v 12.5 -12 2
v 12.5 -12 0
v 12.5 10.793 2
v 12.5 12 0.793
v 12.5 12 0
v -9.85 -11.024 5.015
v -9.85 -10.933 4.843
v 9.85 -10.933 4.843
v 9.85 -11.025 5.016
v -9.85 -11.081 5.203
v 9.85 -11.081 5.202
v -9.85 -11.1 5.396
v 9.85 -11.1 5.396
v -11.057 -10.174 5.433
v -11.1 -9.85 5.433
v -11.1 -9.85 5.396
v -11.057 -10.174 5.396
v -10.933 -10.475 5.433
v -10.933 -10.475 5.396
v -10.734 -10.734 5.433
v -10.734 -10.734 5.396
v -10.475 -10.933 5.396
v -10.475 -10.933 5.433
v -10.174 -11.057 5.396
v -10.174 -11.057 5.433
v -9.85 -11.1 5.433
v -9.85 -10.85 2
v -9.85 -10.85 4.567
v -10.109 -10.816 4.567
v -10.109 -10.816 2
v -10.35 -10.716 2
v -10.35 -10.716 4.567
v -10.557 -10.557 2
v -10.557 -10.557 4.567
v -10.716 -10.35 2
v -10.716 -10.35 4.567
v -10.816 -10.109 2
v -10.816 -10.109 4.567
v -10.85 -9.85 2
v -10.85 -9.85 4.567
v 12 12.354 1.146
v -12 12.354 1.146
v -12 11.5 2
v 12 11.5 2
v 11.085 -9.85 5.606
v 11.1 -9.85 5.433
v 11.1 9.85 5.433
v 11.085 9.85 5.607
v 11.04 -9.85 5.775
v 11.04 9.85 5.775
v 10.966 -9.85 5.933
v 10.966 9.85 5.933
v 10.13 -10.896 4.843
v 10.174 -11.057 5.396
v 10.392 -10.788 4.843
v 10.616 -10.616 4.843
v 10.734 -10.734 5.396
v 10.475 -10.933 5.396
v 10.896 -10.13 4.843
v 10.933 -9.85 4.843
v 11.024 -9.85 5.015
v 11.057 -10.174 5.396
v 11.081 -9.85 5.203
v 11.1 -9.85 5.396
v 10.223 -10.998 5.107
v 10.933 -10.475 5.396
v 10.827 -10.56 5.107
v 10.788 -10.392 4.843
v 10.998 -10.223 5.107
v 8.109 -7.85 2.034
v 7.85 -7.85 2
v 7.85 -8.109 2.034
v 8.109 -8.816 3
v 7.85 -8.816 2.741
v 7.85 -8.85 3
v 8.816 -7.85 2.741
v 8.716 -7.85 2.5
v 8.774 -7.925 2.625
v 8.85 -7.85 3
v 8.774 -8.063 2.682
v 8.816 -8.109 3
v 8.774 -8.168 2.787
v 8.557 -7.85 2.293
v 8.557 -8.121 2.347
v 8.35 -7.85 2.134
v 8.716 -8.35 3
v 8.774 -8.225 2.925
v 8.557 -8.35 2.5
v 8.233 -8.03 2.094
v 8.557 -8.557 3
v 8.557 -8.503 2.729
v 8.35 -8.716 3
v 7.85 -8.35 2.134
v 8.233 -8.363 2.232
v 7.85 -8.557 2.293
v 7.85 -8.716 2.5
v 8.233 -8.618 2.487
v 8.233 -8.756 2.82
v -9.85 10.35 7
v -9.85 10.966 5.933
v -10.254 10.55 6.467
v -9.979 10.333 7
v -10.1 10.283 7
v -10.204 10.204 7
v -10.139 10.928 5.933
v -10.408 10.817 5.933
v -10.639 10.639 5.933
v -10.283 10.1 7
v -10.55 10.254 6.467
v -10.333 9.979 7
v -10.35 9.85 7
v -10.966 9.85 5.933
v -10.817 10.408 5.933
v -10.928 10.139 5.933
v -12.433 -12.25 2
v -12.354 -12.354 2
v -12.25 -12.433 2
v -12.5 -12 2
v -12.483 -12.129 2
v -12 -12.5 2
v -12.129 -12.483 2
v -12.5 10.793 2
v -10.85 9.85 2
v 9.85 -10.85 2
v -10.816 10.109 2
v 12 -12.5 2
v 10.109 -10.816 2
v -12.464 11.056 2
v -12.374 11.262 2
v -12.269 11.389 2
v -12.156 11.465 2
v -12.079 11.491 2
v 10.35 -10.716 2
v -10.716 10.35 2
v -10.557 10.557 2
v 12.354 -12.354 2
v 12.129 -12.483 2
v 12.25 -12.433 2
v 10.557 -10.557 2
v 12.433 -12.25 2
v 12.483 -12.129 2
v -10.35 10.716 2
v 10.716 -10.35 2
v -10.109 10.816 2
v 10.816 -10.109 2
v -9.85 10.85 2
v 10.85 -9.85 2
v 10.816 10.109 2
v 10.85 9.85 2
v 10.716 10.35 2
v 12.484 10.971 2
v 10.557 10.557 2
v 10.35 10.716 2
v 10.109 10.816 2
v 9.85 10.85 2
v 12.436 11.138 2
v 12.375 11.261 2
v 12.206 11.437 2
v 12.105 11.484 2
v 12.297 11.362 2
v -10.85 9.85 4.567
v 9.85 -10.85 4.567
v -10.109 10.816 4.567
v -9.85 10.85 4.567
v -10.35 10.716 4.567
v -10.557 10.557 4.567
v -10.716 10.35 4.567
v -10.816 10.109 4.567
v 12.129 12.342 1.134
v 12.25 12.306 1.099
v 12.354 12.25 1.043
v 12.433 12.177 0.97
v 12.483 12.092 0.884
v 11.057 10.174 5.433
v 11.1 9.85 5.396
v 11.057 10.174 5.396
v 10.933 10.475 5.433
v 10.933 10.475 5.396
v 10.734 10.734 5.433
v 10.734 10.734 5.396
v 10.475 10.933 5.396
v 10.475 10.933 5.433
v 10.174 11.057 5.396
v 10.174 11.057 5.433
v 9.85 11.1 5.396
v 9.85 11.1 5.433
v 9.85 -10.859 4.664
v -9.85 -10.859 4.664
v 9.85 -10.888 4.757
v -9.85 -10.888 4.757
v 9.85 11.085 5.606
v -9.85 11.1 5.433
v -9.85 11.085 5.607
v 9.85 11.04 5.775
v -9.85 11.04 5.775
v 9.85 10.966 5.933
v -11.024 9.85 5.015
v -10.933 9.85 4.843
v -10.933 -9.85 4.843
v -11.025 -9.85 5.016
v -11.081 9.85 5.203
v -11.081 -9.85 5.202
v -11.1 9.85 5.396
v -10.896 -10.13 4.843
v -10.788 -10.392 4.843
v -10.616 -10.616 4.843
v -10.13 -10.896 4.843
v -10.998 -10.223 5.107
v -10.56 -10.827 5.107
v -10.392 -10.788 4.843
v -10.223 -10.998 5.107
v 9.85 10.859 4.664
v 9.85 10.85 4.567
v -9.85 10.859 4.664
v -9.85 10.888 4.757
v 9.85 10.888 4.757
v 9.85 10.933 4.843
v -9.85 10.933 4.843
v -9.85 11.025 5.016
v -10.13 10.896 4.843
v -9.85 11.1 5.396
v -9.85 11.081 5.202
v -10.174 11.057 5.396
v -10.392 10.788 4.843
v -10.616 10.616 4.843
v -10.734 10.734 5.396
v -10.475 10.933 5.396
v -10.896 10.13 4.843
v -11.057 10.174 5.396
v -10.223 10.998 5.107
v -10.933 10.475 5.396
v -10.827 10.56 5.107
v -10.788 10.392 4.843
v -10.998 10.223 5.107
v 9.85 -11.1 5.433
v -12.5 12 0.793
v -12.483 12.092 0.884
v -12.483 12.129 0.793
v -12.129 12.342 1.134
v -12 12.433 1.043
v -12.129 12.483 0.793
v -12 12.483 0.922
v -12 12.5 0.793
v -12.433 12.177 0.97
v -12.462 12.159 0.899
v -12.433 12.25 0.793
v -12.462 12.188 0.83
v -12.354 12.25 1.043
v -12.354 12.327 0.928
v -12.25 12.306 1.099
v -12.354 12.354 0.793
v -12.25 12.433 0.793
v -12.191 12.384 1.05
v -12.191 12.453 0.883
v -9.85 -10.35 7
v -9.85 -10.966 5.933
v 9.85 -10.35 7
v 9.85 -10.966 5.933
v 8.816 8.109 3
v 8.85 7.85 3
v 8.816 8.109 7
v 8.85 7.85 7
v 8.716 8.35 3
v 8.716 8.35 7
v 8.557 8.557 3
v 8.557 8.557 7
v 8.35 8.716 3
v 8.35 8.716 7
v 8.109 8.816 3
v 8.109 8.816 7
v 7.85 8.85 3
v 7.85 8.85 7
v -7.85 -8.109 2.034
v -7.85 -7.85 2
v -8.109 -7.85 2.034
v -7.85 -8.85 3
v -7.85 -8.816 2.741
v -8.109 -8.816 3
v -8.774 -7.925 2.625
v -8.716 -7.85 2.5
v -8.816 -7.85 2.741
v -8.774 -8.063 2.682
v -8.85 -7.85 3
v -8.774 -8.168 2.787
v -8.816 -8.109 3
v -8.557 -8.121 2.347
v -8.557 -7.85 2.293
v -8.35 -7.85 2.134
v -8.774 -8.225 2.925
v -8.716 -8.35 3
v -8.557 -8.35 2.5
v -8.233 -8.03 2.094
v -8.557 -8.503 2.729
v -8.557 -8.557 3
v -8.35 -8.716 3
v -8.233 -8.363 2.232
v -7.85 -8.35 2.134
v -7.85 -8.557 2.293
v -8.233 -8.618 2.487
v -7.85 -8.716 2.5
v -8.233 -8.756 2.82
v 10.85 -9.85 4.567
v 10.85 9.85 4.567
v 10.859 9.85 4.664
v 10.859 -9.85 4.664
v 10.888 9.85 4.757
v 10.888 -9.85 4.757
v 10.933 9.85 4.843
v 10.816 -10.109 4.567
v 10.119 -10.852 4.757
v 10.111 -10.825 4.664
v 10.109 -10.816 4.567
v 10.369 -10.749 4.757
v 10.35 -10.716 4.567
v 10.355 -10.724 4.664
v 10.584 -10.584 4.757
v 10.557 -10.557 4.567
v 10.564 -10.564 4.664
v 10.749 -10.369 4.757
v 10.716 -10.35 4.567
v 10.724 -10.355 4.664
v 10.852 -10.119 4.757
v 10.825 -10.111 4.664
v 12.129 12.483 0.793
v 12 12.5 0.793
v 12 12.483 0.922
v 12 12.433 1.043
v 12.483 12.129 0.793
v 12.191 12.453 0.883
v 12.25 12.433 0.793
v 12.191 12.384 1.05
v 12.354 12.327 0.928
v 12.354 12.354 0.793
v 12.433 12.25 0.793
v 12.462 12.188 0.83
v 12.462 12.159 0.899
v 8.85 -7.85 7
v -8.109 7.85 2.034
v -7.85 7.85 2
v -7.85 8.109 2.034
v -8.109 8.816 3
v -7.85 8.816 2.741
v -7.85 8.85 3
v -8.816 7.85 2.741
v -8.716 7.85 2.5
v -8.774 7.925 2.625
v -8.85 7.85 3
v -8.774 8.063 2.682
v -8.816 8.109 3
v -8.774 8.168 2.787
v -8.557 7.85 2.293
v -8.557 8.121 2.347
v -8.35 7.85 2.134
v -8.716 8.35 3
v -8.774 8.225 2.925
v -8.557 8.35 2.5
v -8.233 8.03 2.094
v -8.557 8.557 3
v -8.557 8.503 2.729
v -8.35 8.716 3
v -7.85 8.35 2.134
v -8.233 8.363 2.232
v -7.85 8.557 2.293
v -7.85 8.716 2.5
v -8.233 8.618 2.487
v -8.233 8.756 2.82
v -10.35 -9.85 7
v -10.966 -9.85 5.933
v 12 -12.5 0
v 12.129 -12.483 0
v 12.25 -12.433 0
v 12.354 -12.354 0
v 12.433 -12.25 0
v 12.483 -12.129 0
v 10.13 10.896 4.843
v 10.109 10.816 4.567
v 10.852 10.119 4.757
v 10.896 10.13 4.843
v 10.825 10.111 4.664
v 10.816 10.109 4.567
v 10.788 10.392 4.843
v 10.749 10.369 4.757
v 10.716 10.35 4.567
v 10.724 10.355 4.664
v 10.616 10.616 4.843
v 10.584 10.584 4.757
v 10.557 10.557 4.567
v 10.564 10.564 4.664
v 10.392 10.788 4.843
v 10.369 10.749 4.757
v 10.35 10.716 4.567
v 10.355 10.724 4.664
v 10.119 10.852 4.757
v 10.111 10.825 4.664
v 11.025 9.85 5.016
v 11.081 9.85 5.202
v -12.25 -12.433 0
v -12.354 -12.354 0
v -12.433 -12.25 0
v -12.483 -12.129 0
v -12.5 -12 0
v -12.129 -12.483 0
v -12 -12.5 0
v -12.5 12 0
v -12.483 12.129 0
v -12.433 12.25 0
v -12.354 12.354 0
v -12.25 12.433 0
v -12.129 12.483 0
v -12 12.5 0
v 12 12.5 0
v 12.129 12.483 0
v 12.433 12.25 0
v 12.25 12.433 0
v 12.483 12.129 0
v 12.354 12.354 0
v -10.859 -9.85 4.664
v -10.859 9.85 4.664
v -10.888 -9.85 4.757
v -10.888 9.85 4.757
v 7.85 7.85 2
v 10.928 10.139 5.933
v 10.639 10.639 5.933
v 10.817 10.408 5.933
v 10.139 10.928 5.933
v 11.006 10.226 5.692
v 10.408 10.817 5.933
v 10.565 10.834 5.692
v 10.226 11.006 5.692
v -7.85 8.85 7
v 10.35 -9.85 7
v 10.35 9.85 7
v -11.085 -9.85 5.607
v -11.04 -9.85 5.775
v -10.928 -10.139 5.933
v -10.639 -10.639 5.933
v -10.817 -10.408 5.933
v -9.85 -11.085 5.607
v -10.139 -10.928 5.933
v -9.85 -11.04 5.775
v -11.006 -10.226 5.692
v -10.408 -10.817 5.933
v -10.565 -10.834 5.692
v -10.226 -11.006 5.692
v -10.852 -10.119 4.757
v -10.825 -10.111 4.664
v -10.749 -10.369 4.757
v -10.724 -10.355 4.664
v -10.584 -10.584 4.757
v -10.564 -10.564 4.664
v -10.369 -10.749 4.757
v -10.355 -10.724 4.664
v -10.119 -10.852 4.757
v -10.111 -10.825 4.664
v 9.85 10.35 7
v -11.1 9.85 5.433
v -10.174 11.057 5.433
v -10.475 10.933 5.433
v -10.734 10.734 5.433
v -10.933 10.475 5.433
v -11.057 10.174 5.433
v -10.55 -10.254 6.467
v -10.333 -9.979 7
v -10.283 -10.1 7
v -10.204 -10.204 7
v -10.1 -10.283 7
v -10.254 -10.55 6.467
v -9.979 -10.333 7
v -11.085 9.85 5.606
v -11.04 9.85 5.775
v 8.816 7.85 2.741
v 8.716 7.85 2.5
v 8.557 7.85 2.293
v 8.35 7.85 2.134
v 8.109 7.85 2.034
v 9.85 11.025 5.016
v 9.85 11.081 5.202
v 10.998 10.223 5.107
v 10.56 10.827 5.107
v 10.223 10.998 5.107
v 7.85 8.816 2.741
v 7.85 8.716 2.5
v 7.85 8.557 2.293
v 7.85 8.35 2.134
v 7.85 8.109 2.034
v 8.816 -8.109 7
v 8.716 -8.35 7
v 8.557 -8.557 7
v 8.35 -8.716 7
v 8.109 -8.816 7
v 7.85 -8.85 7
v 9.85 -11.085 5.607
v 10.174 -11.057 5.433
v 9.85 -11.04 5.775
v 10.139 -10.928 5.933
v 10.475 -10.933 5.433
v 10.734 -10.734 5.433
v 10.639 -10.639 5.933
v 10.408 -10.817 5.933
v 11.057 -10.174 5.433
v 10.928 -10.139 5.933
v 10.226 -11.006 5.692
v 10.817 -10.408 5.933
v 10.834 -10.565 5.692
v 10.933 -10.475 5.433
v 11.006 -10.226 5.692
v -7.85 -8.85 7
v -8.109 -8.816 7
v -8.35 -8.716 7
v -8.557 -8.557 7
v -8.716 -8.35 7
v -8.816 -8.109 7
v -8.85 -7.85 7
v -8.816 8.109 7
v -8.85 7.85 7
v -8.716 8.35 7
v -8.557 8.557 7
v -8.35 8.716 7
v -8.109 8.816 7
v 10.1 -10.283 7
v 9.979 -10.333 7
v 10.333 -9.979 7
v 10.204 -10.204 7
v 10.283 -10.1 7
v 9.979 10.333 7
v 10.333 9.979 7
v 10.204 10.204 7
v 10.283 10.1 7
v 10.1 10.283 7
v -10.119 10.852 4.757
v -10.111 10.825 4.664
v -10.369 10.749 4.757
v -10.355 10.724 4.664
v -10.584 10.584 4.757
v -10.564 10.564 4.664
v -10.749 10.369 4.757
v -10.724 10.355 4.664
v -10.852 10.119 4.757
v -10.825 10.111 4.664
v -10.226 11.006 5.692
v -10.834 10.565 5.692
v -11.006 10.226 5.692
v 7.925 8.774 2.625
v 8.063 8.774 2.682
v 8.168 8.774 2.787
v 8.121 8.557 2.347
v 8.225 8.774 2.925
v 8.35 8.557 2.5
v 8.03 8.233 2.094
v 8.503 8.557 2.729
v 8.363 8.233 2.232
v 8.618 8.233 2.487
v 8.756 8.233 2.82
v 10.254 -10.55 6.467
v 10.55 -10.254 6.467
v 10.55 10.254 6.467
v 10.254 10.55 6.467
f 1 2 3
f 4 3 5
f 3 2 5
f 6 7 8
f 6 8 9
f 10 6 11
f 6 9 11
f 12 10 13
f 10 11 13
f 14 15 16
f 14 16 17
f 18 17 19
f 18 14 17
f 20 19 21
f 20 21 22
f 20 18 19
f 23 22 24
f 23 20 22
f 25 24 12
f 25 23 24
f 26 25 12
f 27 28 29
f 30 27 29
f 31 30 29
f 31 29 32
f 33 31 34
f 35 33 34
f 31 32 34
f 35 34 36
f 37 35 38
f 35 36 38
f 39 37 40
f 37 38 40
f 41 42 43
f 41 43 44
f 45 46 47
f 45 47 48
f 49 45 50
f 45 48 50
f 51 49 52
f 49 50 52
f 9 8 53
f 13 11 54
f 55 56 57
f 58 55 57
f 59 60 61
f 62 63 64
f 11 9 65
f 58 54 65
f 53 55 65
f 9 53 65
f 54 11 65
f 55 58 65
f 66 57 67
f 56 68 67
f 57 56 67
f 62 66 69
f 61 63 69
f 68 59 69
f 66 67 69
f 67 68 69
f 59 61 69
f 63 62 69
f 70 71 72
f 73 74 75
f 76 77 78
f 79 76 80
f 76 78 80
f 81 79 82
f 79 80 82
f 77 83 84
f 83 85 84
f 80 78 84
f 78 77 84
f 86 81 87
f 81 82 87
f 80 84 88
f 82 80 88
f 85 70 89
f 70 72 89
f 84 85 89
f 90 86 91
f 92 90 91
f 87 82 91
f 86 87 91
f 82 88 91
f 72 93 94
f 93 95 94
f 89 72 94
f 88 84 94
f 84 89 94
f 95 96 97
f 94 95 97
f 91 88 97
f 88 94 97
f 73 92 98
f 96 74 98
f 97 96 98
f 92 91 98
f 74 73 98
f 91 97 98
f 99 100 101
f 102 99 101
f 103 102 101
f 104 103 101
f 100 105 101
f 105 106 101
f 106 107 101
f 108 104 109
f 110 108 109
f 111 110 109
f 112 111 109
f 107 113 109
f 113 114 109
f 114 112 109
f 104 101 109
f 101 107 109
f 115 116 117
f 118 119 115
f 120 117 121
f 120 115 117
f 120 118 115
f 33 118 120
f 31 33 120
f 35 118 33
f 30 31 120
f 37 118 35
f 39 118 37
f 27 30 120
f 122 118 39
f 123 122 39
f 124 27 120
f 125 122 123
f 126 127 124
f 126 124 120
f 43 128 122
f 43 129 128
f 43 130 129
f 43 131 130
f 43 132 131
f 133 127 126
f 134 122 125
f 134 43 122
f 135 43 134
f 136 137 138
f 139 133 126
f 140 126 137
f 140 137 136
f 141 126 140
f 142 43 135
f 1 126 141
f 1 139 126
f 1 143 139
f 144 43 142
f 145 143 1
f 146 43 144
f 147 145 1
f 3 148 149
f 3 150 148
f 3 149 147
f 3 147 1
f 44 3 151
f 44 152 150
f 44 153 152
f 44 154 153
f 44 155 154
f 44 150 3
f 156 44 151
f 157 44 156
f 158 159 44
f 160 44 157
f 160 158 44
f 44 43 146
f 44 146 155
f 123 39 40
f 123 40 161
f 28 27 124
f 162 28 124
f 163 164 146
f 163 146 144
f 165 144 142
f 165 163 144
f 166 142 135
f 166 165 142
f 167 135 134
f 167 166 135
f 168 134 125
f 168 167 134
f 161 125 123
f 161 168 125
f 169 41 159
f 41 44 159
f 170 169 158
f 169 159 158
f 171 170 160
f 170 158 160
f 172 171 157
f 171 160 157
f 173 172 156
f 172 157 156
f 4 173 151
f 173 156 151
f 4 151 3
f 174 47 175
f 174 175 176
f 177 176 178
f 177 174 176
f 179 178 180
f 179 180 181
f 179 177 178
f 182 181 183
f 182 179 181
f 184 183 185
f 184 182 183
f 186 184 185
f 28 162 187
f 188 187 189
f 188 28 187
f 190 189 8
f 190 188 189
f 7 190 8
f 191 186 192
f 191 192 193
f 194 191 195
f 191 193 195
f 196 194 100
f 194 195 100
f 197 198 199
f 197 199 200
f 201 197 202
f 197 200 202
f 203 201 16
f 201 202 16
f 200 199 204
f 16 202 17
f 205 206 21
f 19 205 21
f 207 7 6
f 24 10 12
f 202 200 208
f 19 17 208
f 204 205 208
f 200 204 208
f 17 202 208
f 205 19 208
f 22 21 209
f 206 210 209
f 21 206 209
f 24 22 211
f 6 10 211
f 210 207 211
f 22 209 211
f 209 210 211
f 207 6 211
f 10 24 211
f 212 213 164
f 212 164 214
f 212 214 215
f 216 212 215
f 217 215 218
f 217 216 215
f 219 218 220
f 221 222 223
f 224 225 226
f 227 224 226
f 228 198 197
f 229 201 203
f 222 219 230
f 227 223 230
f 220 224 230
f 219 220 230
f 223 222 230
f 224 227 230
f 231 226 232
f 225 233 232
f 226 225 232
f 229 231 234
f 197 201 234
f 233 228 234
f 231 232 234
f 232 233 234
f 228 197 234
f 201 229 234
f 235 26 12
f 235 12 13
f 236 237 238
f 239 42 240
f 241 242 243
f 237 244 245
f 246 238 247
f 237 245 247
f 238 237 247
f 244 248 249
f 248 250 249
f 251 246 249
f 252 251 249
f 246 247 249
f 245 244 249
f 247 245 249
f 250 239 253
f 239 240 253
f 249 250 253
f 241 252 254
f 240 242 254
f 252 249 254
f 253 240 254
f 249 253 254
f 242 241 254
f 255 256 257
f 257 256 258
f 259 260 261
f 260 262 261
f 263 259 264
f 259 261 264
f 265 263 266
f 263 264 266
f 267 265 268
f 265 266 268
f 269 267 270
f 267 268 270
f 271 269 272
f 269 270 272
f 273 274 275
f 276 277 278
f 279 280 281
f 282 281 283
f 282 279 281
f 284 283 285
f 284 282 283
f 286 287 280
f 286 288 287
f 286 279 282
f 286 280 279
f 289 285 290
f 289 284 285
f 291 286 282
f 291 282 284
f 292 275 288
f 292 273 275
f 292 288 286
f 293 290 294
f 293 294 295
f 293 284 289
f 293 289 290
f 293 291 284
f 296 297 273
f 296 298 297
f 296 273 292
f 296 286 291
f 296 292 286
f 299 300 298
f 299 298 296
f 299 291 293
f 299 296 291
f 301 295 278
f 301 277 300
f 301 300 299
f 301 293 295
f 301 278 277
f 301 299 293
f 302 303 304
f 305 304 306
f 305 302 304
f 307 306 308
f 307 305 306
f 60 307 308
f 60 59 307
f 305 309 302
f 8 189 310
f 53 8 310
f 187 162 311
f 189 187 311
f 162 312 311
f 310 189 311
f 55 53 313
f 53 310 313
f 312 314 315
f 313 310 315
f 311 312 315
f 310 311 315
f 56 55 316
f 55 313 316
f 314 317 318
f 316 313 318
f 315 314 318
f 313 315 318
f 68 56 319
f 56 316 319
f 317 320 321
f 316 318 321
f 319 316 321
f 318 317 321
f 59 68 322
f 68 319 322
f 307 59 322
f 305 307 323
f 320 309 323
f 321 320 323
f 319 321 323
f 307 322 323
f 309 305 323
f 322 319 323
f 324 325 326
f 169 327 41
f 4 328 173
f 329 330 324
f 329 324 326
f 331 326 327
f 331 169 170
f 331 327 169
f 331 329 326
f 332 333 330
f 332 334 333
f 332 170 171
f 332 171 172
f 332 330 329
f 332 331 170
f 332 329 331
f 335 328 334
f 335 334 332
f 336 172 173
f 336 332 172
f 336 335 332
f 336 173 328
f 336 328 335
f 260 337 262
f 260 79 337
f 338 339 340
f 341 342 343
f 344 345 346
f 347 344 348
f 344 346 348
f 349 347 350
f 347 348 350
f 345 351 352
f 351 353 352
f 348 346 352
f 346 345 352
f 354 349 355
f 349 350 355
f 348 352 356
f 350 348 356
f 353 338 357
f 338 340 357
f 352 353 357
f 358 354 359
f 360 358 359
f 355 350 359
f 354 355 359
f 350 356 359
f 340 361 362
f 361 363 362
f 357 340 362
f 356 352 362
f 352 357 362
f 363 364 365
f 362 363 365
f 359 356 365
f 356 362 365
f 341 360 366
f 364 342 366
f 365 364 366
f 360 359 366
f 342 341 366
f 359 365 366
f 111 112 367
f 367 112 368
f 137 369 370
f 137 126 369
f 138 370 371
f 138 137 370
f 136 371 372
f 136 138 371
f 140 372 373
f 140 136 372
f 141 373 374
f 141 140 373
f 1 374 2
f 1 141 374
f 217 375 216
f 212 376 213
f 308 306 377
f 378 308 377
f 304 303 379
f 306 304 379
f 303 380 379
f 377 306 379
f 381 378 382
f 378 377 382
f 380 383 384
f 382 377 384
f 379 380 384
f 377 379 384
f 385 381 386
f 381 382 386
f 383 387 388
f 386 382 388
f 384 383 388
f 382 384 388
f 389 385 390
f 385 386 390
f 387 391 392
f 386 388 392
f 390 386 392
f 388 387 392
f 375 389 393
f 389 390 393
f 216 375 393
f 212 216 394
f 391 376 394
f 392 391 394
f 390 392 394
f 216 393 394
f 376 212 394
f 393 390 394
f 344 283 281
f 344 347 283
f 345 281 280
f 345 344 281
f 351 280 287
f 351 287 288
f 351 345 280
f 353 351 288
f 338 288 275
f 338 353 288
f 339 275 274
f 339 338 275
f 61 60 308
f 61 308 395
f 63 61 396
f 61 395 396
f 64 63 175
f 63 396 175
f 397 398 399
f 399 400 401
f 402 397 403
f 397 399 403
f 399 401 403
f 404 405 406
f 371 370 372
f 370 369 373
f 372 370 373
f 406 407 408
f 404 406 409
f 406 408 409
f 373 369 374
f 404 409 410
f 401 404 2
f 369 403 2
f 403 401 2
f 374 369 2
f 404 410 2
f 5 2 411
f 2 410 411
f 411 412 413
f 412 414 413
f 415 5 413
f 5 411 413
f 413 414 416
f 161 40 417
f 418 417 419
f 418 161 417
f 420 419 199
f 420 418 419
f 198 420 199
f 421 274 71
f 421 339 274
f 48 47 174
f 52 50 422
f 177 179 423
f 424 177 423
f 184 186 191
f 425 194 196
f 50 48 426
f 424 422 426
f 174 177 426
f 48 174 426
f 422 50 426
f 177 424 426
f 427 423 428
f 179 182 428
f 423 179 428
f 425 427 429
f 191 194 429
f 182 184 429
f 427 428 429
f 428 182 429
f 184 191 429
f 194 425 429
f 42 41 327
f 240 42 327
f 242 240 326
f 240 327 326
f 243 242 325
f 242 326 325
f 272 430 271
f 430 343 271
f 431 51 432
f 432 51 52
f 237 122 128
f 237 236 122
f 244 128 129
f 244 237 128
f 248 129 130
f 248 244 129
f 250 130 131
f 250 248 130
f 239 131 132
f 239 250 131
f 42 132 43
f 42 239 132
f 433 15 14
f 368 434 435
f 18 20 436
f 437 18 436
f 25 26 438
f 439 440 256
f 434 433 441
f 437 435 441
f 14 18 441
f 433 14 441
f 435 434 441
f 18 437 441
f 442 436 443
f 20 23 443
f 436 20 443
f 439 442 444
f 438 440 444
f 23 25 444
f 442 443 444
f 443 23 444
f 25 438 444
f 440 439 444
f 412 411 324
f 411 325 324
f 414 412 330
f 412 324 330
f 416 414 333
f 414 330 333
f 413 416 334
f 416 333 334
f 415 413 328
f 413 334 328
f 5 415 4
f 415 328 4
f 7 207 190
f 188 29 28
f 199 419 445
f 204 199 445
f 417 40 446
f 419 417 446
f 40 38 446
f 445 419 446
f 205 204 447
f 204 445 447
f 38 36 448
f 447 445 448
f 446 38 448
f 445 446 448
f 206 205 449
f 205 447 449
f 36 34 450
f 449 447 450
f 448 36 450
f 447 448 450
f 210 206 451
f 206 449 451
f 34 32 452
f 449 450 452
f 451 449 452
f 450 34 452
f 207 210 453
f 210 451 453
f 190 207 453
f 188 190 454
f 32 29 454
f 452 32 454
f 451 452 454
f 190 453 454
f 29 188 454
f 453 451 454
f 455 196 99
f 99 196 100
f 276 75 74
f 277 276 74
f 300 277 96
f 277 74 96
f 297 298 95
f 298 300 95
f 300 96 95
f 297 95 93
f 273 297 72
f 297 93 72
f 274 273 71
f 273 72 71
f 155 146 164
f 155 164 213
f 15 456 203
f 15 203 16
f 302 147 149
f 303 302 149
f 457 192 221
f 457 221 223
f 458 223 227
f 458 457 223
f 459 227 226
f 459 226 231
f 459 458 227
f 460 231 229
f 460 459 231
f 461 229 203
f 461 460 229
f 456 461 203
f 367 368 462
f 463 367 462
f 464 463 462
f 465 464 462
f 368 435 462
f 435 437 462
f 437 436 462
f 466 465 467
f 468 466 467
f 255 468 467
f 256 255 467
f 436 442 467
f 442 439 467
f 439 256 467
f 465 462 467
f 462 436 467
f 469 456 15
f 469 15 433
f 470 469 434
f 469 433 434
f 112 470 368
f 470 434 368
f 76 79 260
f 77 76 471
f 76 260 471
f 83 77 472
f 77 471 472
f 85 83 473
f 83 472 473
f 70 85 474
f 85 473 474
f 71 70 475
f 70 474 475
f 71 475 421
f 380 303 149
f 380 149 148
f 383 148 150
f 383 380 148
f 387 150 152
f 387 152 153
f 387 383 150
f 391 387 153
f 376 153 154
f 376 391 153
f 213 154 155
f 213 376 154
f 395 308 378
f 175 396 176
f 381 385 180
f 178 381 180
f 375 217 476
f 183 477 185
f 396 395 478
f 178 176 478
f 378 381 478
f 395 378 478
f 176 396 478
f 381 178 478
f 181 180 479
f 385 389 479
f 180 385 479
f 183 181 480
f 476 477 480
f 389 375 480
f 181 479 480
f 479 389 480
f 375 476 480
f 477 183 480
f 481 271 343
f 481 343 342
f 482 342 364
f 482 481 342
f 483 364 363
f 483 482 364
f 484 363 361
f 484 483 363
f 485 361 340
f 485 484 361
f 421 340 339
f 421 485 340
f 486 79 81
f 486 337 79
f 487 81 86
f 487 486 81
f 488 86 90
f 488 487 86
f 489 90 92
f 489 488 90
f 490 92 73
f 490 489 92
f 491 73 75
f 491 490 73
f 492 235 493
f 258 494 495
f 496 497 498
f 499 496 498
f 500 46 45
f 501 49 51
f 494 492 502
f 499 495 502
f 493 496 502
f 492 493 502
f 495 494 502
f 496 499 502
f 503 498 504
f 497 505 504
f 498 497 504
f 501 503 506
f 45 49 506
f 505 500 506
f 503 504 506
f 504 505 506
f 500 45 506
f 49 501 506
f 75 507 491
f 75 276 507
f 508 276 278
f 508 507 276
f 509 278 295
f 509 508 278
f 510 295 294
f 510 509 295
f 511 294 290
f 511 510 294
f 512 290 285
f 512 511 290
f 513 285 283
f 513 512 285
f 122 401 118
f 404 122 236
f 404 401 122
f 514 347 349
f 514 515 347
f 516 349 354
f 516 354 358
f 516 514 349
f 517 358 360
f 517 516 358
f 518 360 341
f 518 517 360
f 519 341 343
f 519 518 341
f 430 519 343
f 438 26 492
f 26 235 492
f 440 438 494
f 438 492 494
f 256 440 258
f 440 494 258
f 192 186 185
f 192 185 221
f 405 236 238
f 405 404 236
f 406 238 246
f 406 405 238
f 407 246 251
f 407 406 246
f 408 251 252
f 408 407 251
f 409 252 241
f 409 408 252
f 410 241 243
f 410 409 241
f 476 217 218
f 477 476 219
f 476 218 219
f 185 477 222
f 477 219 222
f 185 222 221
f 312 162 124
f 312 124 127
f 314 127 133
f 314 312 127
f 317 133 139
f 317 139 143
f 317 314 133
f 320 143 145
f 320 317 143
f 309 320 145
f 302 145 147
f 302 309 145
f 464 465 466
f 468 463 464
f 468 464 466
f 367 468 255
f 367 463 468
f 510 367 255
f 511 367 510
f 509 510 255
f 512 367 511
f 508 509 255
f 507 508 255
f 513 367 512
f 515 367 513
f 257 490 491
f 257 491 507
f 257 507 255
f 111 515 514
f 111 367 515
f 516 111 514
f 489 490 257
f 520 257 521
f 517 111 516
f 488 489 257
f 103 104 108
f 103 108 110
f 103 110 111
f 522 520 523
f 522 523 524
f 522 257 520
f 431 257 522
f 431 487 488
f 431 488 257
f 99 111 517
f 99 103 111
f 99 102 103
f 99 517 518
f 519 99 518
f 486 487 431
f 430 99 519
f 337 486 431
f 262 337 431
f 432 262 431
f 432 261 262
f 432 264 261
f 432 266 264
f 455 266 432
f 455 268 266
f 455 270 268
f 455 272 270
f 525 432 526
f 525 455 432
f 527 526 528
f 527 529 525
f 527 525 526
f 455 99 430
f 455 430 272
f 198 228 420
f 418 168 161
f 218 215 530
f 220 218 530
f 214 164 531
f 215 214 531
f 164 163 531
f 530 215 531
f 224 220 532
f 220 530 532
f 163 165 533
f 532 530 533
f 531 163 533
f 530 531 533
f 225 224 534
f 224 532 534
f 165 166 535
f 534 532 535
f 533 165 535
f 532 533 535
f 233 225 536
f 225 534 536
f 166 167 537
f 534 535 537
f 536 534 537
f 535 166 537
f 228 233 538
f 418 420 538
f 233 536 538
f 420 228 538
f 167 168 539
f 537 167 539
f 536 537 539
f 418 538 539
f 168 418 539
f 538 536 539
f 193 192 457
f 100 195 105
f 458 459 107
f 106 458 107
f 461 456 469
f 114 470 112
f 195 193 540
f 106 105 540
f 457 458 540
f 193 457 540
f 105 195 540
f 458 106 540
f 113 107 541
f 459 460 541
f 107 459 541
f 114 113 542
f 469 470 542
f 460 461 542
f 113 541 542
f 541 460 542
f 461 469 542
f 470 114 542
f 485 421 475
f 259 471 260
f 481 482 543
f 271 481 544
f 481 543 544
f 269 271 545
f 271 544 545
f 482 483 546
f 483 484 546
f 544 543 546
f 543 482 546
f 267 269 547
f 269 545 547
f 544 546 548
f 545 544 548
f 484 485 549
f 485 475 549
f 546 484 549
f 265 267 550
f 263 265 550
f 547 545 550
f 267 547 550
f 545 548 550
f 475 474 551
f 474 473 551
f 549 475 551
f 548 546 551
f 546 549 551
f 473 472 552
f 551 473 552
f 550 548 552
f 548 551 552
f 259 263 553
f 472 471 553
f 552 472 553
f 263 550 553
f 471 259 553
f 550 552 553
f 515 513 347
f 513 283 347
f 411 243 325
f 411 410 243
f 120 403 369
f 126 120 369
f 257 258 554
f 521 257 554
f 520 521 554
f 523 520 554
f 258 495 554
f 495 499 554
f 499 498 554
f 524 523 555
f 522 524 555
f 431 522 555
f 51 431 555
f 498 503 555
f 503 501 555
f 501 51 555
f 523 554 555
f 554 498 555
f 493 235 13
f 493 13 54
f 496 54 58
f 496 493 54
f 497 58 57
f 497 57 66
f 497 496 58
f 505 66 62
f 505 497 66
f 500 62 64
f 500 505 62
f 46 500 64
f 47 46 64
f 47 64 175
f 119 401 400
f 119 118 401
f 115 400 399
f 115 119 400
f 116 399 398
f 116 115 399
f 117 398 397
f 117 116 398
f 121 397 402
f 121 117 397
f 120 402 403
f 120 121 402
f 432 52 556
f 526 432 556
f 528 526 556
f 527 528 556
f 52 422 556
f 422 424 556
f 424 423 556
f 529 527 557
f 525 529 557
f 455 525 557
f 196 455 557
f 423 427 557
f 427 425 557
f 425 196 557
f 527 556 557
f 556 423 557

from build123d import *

# Parameters (mm, degrees)
SKIZZE1_W                       = 25
SKIZZE1_H                       = 25
AUFSATZ_LINEAR_AUSTRAGEN1_DEPTH = 2
SKIZZE2_W                       = 21.7
SKIZZE2_H                       = 21.7
SKIZZE2_W_2                     = 17.7
SKIZZE2_H_2                     = 17.7
LINEAR_AUSTRAGEN_D_NN1_DEPTH    = 5
VERRUNDUNG1_R                   = 1
LINEAR_AUSTRAGEN_D_NN2_DEPTH    = 2
FASE1_SIZE                      = 0.75
FASE1_SIZE2                     = 1.299038106
VERRUNDUNG2_R                   = 0.5
VERRUNDUNG3_R                   = 1
FASE2_SIZE                      = 1
VERRUNDUNG5_R                   = 0.5
VERRUNDUNG4_R                   = 0.5
VERRUNDUNG6_R                   = 1


with BuildPart() as part:
    # Skizze1 → Aufsatz-Linear austragen1 (new body)
    with BuildSketch(Plane.XY):
        Rectangle(SKIZZE1_W, SKIZZE1_H)
    extrude(amount=AUFSATZ_LINEAR_AUSTRAGEN1_DEPTH)

    # Skizze2 → Linear-Austragen-Dünn1 (add)
    with BuildSketch(Plane.XY.offset(2)):
        Rectangle(SKIZZE2_W, SKIZZE2_H)
        Rectangle(SKIZZE2_W_2, SKIZZE2_H_2, mode=Mode.SUBTRACT)
    extrude(amount=LINEAR_AUSTRAGEN_D_NN1_DEPTH)

    # Verrundung1
    verrundung1_edges = [part.edges().sort_by_distance(p)[0] for p in [
        (-10.85, -10.85, 4.5),
        (10.85, -10.85, 4.5),
        (10.85, 10.85, 4.5),
        (-10.85, 10.85, 4.5),
    ]]
    fillet(verrundung1_edges, radius=VERRUNDUNG1_R)

    # Skizze3 → Linear-Austragen-Dünn2 (add)
    with BuildSketch(Plane.XY.offset(7)):
        with BuildLine():
            Line((9.85, 11.1), (-9.85, 11.1))
            ThreePointArc((-9.85, 11.1), (-10.733883476, 10.733883476), (-11.1, 9.85))
            Line((-11.1, 9.85), (-11.1, -9.85))
            ThreePointArc((-11.1, -9.85), (-10.733883476, -10.733883476), (-9.85, -11.1))
            Line((-9.85, -11.1), (9.85, -11.1))
            ThreePointArc((9.85, -11.1), (10.733883476, -10.733883476), (11.1, -9.85))
            Line((11.1, -9.85), (11.1, 9.85))
            ThreePointArc((11.1, 9.85), (10.733883476, 10.733883476), (9.85, 11.1))
        make_face()
        with BuildLine():
            Line((9.85, 10.85), (-9.85, 10.85))
            ThreePointArc((-9.85, 10.85), (-10.557106781, 10.557106781), (-10.85, 9.85))
            Line((-10.85, 9.85), (-10.85, -9.85))
            ThreePointArc((-10.85, -9.85), (-10.557106781, -10.557106781), (-9.85, -10.85))
            Line((-9.85, -10.85), (9.85, -10.85))
            ThreePointArc((9.85, -10.85), (10.557106781, -10.557106781), (10.85, -9.85))
            Line((10.85, -9.85), (10.85, 9.85))
            ThreePointArc((10.85, 9.85), (10.557106781, 10.557106781), (9.85, 10.85))
        make_face(mode=Mode.SUBTRACT)
    extrude(amount=-LINEAR_AUSTRAGEN_D_NN2_DEPTH)

    # Fase1
    fase1_edges = [part.edges().sort_by_distance(p)[0] for p in [
        (10.733883476, 10.733883476, 7),
        (0, 11.1, 7),
        (-10.733883476, 10.733883476, 7),
        (-11.1, 0, 7),
        (-10.733883476, -10.733883476, 7),
        (0, -11.1, 7),
        (10.733883476, -10.733883476, 7),
        (11.1, 0, 7),
    ]]
    fase1_side = [part.faces().sort_by_distance(p)[0] for p in [
        (10.511883476, 10.511883476, 7),
    ]]
    chamfer(fase1_edges, length=FASE1_SIZE, length2=FASE1_SIZE2, reference=fase1_side[0])

    # Verrundung2
    # the kernel refuses this fillet: 0.5 mm, written as the material it adds along each edge
    with BuildSketch(Plane(origin=(10.85, -9.85, 5), x_dir=(1, 0, 0), z_dir=(0, 1, 0)), Plane(origin=(9.85, 10.85, 5), x_dir=(0, 1, 0), z_dir=(-1, 0, 0)), Plane(origin=(-10.85, 9.85, 5), x_dir=(-1, 0, 0), z_dir=(0, -1, 0)), Plane(origin=(-9.85, -10.85, 5), x_dir=(0, -1, 0), z_dir=(1, 0, 0))) as verrundung2_piece_1:
        with BuildLine():
            CenterArc((0.5, 0.433012702), VERRUNDUNG2_R, 180, 60)
            Line((0, 0.433012702), (-0.01, 0.433012702))
            Line((-0.01, 0.433012702), (-0.01, 0))
            Line((-0.01, 0), (0, -0.01))
            ThreePointArc((0, -0.01), (0.125, -0.01), (0.245, -0.008660254))
            Line((0.245, -0.008660254), (0.25, 0))
        make_face()
    extrude(amount=19.7)
    with BuildSketch(Plane(origin=(9.85, 9.85, 5), x_dir=(1, 0, 0), z_dir=(0, -1, 0))) as verrundung2_piece_2:
        with BuildLine():
            CenterArc((1.5, -0.433012702), VERRUNDUNG2_R, 120, 60)
            Line((1, -0.433012702), (0.99, -0.433012702))
            Line((0.99, -0.433012702), (0.99, 0))
            Line((0.99, 0), (1, 0.01))
            ThreePointArc((1, 0.01), (1.125, 0.01), (1.245, 0.008660254))
            Line((1.245, 0.008660254), (1.25, 0))
        make_face()
    revolve(axis=Axis((9.85, 9.85, 5), (0, 0, 1)), revolution_arc=90)
    with BuildSketch(Plane(origin=(-9.85, 9.85, 5), x_dir=(0, 1, 0), z_dir=(1, 0, 0))) as verrundung2_piece_3:
        with BuildLine():
            CenterArc((1.5, -0.433012702), VERRUNDUNG2_R, 120, 60)
            Line((1, -0.433012702), (0.99, -0.433012702))
            Line((0.99, -0.433012702), (0.99, 0))
            Line((0.99, 0), (1, 0.01))
            ThreePointArc((1, 0.01), (1.125, 0.01), (1.245, 0.008660254))
            Line((1.245, 0.008660254), (1.25, 0))
        make_face()
    revolve(axis=Axis((-9.85, 9.85, 5), (0, 0, 1)), revolution_arc=90)
    with BuildSketch(Plane(origin=(-9.85, -9.85, 5), x_dir=(-1, 0, 0), z_dir=(0, 1, 0))) as verrundung2_piece_4:
        with BuildLine():
            CenterArc((1.5, -0.433012702), VERRUNDUNG2_R, 120, 60)
            Line((1, -0.433012702), (0.99, -0.433012702))
            Line((0.99, -0.433012702), (0.99, 0))
            Line((0.99, 0), (1, 0.01))
            ThreePointArc((1, 0.01), (1.125, 0.01), (1.245, 0.008660254))
            Line((1.245, 0.008660254), (1.25, 0))
        make_face()
    revolve(axis=Axis((-9.85, -9.85, 5), (0, 0, 1)), revolution_arc=90)
    with BuildSketch(Plane(origin=(9.85, -9.85, 5), x_dir=(0, -1, 0), z_dir=(-1, 0, 0))) as verrundung2_piece_5:
        with BuildLine():
            CenterArc((1.5, -0.433012702), VERRUNDUNG2_R, 120, 60)
            Line((1, -0.433012702), (0.99, -0.433012702))
            Line((0.99, -0.433012702), (0.99, 0))
            Line((0.99, 0), (1, 0.01))
            ThreePointArc((1, 0.01), (1.125, 0.01), (1.245, 0.008660254))
            Line((1.245, 0.008660254), (1.25, 0))
        make_face()
    revolve(axis=Axis((9.85, -9.85, 5), (0, 0, 1)), revolution_arc=90)

    # Verrundung3
    verrundung3_edges = [part.edges().sort_by_distance(p)[0] for p in [
        (0, -11.1, 5.700961894),
        (10.733883476, -10.733883476, 5.700961894),
        (-10.733883476, -10.733883476, 5.700961894),
        (11.1, 0, 5.700961894),
        (-11.1, 0, 5.700961894),
        (10.733883476, 10.733883476, 5.700961894),
        (-10.733883476, 10.733883476, 5.700961894),
        (0, 11.1, 5.700961894),
        (10.733883476, 10.733883476, 5),
        (11.1, 0, 5),
        (10.733883476, -10.733883476, 5),
        (0, -11.1, 5),
        (-10.733883476, -10.733883476, 5),
        (-11.1, 0, 5),
        (-10.733883476, 10.733883476, 5),
        (0, 11.1, 5),
    ]]
    fillet(verrundung3_edges, radius=VERRUNDUNG3_R)

    # Fase2
    fase2_edges = [part.edges().sort_by_distance(p)[0] for p in [
        (0, 12.5, 2),
    ]]
    chamfer(fase2_edges, length=FASE2_SIZE)

    # Verrundung5
    verrundung5_edges = [part.edges().sort_by_distance(p)[0] for p in [
        (0, 12.5, 1),
    ]]
    fillet(verrundung5_edges, radius=VERRUNDUNG5_R)

    # Verrundung4
    verrundung4_edges = [part.edges().sort_by_distance(p)[0] for p in [
        (-12.5, 11.926776695, 1.573223305),
        (-12.5, 12.5, 0.396446609),
        (12.5, 12.5, 0.396446609),
        (12.5, 11.926776695, 1.573223305),
        (12.5, 12.461939766, 0.984234935),
        (-12.5, 12.461939766, 0.984234935),
        (12.5, -12.5, 1),
        (-12.5, -12.5, 1),
    ]]
    fillet(verrundung4_edges, radius=VERRUNDUNG4_R)

    # Verrundung6
    verrundung6_edges = [part.edges().sort_by_distance(p)[0] for p in [
        (0, -8.85, 2),
        (8.85, 0, 2),
        (0, 8.85, 2),
        (-8.85, 0, 2),
        (8.85, -8.85, 4.5),
        (8.85, 8.85, 4.5),
        (-8.85, 8.85, 4.5),
        (-8.85, -8.85, 4.5),
    ]]
    fillet(verrundung6_edges, radius=VERRUNDUNG6_R)


solid = part.part
